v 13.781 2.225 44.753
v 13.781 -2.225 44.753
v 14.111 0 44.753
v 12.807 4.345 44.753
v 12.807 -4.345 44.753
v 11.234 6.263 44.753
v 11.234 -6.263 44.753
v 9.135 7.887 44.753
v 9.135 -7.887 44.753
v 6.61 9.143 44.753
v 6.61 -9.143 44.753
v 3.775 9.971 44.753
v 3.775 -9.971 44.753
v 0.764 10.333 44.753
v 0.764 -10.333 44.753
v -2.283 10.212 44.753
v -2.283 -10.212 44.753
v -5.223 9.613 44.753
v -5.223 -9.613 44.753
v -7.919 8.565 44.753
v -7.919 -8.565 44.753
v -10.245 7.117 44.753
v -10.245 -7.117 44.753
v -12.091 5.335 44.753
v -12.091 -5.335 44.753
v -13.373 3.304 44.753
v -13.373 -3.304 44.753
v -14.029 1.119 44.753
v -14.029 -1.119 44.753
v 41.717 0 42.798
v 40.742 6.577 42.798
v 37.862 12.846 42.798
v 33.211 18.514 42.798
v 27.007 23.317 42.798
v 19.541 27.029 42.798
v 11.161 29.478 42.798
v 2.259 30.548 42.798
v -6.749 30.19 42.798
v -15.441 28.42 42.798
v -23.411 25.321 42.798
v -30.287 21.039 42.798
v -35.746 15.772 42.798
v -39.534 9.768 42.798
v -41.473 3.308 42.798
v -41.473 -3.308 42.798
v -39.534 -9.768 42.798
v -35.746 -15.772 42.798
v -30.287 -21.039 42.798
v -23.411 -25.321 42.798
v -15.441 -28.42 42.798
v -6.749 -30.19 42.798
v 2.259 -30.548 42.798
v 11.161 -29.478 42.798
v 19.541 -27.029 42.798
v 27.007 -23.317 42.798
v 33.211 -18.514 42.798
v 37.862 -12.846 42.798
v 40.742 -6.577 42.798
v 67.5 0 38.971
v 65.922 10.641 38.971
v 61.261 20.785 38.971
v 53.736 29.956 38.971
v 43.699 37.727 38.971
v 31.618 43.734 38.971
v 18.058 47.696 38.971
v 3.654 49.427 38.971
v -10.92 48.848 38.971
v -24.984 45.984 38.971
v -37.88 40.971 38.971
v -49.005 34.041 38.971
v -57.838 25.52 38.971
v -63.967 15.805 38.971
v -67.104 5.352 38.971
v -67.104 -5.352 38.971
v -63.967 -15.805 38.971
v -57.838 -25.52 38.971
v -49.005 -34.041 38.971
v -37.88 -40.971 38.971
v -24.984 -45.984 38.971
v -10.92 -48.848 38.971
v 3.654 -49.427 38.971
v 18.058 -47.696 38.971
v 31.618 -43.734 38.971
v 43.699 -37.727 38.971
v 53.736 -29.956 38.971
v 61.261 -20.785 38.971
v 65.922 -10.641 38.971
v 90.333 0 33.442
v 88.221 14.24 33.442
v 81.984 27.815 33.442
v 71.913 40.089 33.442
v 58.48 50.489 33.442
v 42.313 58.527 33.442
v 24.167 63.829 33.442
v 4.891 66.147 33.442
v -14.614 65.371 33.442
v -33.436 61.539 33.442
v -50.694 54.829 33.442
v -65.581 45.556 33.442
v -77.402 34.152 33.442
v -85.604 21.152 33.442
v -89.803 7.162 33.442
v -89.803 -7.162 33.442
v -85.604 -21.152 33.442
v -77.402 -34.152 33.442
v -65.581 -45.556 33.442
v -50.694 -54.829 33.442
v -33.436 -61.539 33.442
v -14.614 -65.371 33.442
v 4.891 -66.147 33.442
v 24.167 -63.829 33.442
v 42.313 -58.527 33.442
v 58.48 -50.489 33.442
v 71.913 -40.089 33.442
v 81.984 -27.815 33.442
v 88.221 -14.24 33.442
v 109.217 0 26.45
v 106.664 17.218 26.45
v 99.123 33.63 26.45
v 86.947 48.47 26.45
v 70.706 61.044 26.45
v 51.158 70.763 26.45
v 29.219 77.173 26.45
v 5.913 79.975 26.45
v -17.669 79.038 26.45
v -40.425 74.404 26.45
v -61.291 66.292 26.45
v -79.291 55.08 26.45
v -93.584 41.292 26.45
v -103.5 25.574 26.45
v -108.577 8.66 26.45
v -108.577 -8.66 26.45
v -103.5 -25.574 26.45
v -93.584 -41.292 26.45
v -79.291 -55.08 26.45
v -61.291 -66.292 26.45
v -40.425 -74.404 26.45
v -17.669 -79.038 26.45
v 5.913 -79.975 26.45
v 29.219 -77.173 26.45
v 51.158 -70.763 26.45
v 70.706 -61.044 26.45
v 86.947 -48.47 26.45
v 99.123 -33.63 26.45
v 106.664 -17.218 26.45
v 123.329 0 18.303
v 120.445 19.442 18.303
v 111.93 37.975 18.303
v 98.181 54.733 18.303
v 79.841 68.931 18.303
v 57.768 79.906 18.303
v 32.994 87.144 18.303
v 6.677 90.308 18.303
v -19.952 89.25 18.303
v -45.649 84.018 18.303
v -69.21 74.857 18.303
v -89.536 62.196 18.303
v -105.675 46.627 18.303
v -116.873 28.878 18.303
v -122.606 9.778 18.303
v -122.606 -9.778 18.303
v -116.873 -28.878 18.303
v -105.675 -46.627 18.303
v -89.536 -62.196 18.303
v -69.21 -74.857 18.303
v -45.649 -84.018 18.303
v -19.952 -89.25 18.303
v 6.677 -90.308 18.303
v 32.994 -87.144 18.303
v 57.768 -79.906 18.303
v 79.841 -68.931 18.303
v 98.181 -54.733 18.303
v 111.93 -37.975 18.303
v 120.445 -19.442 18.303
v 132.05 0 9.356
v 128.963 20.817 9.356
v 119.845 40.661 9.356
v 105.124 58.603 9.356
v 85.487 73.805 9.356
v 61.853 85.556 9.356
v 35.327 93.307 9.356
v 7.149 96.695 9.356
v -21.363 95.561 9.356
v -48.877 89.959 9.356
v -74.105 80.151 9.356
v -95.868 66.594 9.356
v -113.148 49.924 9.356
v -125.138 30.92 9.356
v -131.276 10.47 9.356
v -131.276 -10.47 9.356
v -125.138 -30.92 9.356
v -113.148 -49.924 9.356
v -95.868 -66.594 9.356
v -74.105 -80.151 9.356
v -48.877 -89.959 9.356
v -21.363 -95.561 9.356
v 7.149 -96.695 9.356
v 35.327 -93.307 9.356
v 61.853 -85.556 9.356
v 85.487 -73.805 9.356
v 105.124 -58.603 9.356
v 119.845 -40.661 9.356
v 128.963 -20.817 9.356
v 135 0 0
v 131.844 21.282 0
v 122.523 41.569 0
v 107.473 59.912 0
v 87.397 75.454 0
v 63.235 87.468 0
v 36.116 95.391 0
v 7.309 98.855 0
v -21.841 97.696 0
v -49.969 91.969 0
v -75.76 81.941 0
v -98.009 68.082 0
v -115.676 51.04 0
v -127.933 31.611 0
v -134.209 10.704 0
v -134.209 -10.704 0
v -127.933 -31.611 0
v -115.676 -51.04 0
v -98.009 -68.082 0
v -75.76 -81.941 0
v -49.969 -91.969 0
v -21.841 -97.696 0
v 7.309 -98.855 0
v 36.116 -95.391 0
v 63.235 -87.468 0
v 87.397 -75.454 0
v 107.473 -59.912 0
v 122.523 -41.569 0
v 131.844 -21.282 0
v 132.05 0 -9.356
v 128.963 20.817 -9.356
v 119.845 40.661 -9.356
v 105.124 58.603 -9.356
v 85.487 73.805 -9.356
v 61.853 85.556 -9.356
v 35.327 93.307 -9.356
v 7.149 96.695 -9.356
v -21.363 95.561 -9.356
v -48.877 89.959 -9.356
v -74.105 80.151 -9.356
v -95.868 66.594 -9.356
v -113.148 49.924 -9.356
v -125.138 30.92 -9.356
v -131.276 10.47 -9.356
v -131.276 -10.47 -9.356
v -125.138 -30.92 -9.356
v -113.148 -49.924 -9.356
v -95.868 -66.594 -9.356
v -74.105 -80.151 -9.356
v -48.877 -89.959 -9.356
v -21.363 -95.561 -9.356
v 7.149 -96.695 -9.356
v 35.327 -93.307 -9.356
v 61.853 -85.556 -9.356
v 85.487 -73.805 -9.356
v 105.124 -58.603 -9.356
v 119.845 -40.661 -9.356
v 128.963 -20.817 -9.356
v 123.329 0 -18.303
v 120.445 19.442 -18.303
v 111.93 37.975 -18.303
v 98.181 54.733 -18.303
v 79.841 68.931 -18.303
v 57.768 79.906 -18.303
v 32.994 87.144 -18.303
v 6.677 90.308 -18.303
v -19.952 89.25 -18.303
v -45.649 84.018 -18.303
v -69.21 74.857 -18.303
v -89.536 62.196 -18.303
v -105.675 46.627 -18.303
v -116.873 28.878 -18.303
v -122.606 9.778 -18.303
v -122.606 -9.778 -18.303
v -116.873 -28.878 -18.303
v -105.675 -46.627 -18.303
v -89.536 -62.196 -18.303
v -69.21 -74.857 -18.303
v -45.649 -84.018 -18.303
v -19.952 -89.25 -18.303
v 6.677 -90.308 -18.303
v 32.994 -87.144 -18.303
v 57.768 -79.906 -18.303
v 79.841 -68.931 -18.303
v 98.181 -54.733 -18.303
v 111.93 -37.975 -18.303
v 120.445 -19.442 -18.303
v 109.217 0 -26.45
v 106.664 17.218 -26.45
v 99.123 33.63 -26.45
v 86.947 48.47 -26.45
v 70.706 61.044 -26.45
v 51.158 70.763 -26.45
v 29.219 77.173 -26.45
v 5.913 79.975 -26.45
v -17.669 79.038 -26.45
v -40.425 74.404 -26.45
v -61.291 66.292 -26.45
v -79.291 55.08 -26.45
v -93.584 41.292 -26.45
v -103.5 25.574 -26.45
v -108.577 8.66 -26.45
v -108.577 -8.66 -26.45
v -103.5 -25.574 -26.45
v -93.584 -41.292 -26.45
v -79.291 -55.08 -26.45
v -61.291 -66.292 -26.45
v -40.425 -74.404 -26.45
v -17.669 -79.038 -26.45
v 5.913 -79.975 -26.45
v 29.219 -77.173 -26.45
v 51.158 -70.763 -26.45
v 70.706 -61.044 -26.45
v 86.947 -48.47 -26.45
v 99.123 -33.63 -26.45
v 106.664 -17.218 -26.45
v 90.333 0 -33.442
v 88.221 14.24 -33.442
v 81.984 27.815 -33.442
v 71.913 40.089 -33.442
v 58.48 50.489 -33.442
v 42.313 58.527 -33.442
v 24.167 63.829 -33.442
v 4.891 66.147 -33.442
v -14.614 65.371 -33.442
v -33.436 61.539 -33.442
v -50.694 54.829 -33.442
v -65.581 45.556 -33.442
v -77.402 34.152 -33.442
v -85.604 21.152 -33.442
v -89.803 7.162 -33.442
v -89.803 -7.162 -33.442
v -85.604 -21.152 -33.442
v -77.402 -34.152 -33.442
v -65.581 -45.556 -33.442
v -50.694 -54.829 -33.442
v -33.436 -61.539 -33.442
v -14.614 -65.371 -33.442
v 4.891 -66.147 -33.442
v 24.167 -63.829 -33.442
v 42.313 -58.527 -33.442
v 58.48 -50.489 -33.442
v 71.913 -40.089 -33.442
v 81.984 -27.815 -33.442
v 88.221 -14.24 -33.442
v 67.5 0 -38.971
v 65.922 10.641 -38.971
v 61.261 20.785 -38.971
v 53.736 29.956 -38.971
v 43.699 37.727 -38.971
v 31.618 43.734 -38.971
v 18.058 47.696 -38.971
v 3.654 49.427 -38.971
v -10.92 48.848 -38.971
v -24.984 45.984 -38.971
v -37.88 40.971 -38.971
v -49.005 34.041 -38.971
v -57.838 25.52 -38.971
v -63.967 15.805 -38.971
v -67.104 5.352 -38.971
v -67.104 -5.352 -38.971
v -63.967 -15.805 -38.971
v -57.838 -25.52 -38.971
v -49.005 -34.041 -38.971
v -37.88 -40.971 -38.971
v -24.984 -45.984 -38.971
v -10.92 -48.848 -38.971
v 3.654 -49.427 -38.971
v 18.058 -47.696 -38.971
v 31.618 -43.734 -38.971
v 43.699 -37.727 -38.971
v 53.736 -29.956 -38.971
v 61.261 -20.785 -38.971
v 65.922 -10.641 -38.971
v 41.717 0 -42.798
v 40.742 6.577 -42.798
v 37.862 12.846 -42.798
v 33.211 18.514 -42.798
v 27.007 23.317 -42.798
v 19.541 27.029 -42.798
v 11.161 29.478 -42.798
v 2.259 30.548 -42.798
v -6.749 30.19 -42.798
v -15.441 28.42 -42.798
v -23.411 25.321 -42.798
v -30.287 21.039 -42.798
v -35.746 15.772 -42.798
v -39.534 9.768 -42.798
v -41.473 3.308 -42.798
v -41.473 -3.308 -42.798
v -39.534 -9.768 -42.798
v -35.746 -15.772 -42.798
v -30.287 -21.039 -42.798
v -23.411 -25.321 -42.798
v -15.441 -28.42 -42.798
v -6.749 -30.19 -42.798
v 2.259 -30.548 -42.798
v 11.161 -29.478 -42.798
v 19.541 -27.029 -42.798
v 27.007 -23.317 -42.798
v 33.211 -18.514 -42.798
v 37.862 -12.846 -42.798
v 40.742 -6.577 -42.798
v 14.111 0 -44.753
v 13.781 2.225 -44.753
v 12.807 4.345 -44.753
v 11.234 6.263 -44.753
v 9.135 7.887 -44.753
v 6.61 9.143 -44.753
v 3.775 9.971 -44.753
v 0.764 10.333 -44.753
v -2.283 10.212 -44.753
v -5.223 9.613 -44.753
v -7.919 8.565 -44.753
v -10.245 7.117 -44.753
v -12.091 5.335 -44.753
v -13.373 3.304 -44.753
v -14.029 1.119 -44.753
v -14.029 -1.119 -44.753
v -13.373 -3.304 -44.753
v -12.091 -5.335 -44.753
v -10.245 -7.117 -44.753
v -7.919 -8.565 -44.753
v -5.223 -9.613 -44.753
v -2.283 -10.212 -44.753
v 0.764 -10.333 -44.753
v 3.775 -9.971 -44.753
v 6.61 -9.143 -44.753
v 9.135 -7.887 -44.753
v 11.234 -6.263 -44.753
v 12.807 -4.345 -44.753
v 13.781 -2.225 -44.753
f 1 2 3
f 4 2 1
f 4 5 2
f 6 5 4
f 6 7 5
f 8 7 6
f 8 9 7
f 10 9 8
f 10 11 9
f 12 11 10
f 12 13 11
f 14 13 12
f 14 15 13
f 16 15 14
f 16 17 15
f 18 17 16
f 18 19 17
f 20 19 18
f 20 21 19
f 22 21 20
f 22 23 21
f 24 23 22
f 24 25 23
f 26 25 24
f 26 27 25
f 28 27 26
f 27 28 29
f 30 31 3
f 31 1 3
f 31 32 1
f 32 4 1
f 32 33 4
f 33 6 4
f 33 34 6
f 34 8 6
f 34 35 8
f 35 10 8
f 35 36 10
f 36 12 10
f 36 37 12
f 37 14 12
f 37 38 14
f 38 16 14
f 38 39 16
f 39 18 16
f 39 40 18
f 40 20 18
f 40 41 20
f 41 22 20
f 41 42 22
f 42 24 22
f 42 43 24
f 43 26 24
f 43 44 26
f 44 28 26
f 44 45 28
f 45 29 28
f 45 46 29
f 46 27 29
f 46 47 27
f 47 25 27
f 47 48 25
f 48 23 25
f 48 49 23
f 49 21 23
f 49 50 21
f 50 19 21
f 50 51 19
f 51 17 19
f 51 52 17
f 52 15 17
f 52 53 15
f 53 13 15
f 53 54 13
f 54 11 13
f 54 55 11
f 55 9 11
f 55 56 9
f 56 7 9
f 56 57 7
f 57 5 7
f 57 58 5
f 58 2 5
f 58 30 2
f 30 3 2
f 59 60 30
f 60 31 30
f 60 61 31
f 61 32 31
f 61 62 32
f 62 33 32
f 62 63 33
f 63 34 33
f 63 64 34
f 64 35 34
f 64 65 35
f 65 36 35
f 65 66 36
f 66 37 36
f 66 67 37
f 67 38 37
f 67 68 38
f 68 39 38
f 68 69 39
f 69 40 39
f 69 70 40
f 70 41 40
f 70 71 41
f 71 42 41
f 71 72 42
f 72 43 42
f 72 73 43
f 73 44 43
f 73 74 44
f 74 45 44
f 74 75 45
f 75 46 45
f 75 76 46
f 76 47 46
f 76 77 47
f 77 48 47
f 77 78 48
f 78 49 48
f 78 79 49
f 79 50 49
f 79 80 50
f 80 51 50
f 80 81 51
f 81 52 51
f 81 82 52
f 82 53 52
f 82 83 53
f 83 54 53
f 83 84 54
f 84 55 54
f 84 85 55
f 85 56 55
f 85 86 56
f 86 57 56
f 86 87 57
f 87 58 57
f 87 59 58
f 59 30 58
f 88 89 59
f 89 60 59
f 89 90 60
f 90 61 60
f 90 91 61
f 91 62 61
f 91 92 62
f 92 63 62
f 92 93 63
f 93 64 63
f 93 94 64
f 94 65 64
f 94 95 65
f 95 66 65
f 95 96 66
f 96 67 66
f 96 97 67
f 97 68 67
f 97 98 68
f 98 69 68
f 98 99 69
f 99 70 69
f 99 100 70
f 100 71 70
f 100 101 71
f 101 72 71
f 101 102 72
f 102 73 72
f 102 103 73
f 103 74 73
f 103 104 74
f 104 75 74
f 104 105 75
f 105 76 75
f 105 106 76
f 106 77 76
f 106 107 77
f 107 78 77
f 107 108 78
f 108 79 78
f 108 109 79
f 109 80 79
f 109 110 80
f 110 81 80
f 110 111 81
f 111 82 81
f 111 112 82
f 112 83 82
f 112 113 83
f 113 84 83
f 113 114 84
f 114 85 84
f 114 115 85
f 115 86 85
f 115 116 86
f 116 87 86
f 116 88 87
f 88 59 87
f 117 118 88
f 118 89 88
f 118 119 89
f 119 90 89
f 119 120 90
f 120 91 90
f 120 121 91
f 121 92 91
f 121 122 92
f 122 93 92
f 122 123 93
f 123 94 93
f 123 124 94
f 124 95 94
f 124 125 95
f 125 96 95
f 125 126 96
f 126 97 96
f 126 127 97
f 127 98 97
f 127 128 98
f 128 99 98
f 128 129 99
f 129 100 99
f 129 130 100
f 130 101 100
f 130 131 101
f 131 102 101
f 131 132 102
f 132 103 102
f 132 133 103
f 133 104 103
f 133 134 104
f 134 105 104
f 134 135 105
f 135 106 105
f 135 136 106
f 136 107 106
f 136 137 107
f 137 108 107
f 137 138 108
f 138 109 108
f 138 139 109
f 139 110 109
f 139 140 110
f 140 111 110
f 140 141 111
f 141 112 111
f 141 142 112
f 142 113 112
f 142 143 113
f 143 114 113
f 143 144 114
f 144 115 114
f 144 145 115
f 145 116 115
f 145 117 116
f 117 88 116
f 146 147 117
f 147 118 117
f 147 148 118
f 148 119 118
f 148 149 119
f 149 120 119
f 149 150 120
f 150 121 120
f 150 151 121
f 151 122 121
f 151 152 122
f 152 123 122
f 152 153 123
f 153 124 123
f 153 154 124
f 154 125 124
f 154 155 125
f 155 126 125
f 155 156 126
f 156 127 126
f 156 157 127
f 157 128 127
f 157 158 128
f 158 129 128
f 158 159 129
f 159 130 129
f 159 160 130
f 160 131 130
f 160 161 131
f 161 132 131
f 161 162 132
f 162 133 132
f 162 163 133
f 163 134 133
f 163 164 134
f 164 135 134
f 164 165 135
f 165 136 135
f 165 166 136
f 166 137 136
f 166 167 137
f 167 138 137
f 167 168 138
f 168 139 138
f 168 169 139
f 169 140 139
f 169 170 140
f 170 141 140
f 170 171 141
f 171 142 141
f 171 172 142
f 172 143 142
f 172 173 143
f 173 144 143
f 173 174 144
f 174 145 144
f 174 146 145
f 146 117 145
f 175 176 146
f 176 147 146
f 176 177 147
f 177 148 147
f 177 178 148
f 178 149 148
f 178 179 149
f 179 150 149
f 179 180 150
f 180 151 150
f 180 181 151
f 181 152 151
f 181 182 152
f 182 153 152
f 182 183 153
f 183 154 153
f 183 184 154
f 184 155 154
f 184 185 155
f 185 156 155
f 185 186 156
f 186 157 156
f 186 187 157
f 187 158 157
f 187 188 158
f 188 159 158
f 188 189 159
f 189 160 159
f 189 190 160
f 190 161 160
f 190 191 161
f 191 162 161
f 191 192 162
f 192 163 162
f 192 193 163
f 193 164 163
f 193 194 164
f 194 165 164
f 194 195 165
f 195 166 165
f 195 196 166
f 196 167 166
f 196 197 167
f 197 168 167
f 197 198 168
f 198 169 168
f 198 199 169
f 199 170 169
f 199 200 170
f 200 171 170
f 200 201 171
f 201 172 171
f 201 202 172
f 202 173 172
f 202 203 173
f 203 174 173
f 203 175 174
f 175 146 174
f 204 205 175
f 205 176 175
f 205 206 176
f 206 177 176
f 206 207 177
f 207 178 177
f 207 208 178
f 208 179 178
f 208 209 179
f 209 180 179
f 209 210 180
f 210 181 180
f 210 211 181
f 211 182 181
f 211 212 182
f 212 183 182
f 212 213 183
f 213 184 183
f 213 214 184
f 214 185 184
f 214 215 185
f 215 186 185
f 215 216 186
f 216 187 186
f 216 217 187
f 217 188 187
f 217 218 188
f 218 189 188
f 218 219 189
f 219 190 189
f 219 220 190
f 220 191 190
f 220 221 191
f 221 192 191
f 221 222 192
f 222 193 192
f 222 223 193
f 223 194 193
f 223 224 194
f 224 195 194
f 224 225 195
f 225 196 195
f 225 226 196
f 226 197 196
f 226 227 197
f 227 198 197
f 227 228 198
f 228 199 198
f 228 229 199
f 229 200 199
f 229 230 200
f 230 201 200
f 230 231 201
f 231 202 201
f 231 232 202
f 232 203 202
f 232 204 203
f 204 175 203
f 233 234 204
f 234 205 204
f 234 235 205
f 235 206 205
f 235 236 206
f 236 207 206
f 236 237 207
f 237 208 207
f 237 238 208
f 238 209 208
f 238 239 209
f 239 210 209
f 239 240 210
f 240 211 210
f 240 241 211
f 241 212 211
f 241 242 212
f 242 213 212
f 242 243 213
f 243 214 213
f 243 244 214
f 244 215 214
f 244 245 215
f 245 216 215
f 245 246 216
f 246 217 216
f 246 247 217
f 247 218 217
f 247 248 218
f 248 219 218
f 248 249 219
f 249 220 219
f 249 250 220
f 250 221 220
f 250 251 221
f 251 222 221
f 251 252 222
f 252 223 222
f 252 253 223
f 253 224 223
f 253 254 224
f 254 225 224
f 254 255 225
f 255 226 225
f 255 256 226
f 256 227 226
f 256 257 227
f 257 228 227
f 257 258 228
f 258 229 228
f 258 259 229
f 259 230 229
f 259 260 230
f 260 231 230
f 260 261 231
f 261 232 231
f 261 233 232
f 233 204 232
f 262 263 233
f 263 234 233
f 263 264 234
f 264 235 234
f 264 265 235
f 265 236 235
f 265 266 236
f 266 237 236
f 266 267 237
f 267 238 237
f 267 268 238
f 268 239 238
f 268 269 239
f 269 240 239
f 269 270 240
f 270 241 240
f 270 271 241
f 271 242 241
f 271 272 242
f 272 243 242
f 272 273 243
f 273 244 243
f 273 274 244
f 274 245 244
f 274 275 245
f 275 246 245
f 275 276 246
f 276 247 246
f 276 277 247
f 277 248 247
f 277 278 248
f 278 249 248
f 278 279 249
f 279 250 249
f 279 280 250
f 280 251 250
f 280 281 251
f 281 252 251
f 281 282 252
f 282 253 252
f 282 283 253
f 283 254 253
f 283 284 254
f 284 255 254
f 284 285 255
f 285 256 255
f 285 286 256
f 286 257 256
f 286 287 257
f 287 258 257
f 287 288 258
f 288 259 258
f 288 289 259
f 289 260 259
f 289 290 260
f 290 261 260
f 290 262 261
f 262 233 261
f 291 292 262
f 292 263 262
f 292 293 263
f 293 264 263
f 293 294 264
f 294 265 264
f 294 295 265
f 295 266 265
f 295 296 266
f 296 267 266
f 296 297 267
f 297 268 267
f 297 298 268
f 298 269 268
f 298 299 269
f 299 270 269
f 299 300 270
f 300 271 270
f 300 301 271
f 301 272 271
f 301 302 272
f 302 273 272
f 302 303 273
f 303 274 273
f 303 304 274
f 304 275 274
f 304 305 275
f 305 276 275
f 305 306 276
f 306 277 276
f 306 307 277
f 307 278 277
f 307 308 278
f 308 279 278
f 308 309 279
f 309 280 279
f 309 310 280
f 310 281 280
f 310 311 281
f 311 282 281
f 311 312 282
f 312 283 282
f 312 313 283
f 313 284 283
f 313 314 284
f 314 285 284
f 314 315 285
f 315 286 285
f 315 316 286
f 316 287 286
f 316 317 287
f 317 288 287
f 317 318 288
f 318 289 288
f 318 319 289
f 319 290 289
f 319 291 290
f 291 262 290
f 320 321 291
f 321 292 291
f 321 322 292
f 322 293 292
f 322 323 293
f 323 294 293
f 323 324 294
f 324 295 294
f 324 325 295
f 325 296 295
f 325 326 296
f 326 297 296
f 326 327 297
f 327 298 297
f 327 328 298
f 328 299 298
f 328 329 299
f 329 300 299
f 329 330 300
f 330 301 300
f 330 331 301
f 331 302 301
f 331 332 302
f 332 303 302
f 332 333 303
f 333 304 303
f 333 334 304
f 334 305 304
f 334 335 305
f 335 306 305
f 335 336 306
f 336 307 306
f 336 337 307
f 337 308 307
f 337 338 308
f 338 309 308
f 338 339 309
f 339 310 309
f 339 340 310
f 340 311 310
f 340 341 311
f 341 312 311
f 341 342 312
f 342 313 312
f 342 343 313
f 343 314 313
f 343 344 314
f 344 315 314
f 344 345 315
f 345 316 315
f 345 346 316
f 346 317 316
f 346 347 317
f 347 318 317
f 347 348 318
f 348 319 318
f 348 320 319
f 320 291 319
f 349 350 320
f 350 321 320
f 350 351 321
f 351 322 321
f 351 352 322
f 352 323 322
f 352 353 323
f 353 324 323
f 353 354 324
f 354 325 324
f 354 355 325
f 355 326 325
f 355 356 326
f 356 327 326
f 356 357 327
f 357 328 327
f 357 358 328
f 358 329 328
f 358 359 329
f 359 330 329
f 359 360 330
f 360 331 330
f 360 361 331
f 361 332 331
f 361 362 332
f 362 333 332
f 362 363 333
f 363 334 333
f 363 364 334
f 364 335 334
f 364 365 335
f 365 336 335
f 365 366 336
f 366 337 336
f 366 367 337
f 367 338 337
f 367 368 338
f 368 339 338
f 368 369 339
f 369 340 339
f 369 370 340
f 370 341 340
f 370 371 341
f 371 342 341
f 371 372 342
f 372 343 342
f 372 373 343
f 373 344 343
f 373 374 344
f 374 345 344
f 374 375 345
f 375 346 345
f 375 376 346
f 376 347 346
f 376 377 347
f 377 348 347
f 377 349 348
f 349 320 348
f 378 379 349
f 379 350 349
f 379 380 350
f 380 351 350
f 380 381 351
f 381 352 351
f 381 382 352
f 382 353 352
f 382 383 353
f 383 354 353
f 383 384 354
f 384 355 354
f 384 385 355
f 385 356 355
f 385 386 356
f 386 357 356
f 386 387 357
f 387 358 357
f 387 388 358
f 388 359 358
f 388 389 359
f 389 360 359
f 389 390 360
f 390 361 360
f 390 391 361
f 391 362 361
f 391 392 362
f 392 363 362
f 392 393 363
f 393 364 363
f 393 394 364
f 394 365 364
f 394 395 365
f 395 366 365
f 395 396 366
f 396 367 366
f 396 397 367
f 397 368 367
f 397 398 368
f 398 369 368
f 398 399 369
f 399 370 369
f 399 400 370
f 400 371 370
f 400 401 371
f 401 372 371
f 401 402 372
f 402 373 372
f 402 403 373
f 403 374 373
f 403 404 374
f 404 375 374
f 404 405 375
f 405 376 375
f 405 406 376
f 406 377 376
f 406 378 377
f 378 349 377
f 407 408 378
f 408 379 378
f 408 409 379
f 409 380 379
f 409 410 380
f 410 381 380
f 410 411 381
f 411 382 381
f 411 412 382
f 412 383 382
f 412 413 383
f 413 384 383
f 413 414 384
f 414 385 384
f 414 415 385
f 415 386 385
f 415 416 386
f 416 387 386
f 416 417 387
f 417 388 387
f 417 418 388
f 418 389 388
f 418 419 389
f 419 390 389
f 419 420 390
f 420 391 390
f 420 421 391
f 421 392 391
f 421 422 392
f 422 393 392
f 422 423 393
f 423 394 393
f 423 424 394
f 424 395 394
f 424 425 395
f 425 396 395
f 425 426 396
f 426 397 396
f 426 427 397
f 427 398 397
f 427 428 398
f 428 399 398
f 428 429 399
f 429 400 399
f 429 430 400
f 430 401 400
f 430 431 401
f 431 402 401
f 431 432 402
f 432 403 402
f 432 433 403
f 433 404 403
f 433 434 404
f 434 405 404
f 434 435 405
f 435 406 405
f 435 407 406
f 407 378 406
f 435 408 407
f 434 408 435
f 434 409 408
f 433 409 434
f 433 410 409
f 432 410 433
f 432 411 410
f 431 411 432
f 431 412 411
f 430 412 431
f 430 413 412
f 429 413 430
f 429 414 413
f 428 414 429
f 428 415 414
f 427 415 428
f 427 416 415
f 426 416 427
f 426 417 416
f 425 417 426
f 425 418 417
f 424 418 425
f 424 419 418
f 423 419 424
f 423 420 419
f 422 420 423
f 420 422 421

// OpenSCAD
// Generated by SolidPython 1.0.1 on 2020-07-29 00:46:52


scale(v = [15, 11, 5]) {
	sphere(r = 9);
}
/***********************************************
*********      SolidPython code:      **********
************************************************
 
# import packages: SolidPython
from solid import *
from solid.utils import *
from itertools import chain, combinations, permutations


class Resize:

    def __init__(self, scad_file):
        self.scad_file = scad_file
        #self.scad_file = import_scad(scad_file)
        # cone/cylinder param:
        self.r1 = 0
        self.r2 = 0
        self.h = 0
        # rectangular prism param:
        self.w = 0
        self.l = 0
        # ellipse param:
        self.r = 0

    # import OpenScad code (file name corresponds to shape)


    # classify shape + parameters
    def assign(self, param1, param2, param3):
        if self.scad_file == 'cone.scad':
            self.r1 = param1
            self.r2 = param2
            self.h = param3
        elif self.scad_file == 'cylinder.scad':
            self.r1 = param1
            self.r2 = param2
            self.h = param3
        elif self.scad_file == 'rectangularPrism.scad':
            self.h = param1
            self.l = param2
            self.w = param3
        else:
            self.r = param1
            self.h = param2

    # resize parameters
    def iterate(self):
        x = range(3, 20, 2)
        i = 1
        if self.scad_file == 'cone.scad':
            tempList = list(permutations(x, 2))
            for temp in tempList:
                param1 = temp[0]
                param2 = temp[1]
                filepath = 'produced_scad_files/' + 'cone' + str(param1) + '_' + str(param2) + '_' + '.scad'
                scad_render_to_file(cylinder(h=param1, r1=param2, r2=0), filepath)

        elif self.scad_file == 'cylinder.scad':
            tempList = list(permutations(x, 3))
            for temp in tempList:
                param1 = temp[0]
                param2 = temp[1]
                filepath = 'produced_scad_files/' + 'cylinder' + str(param1) + '_' + str(param2) + '_' + '.scad'
                scad_render_to_file(cylinder(h=param1, r1=param2, r2=param2), filepath)

        elif self.scad_file == 'rectangularPrism.scad':
            tempList = list(permutations(x, 3))
            for temp in tempList:
                param1 = temp[0]
                param2 = temp[1]
                param3 = temp[2]
                filepath = 'produced_scad_files/' + 'rectangularPrism' + str(param1) + '_' + str(param2) + '_' + str(
                    param3) + '.scad'
                scad_render_to_file(cube(size=(param1, param2, param3)), filepath)

        elif self.scad_file == 'ellipse.scad':
            tempList = list(permutations(x, 4))
            for temp in tempList:
                param1 = temp[0]
                param2 = temp[1]
                param3 = temp[2]
                param4 = temp[3]
                filepath = 'produced_scad_files/' + 'ellipse' + str(param1) + '_' + str(param2) + '_' + str(param3) + '_' + str(param4) + '.scad'
                scad_render_to_file(scale([param1, param2, param3])(sphere(r=param4)), filepath)

    def render_to_scadfile(self):
        scad_render_to_file(scad, 'example.scad') 
 
************************************************/
